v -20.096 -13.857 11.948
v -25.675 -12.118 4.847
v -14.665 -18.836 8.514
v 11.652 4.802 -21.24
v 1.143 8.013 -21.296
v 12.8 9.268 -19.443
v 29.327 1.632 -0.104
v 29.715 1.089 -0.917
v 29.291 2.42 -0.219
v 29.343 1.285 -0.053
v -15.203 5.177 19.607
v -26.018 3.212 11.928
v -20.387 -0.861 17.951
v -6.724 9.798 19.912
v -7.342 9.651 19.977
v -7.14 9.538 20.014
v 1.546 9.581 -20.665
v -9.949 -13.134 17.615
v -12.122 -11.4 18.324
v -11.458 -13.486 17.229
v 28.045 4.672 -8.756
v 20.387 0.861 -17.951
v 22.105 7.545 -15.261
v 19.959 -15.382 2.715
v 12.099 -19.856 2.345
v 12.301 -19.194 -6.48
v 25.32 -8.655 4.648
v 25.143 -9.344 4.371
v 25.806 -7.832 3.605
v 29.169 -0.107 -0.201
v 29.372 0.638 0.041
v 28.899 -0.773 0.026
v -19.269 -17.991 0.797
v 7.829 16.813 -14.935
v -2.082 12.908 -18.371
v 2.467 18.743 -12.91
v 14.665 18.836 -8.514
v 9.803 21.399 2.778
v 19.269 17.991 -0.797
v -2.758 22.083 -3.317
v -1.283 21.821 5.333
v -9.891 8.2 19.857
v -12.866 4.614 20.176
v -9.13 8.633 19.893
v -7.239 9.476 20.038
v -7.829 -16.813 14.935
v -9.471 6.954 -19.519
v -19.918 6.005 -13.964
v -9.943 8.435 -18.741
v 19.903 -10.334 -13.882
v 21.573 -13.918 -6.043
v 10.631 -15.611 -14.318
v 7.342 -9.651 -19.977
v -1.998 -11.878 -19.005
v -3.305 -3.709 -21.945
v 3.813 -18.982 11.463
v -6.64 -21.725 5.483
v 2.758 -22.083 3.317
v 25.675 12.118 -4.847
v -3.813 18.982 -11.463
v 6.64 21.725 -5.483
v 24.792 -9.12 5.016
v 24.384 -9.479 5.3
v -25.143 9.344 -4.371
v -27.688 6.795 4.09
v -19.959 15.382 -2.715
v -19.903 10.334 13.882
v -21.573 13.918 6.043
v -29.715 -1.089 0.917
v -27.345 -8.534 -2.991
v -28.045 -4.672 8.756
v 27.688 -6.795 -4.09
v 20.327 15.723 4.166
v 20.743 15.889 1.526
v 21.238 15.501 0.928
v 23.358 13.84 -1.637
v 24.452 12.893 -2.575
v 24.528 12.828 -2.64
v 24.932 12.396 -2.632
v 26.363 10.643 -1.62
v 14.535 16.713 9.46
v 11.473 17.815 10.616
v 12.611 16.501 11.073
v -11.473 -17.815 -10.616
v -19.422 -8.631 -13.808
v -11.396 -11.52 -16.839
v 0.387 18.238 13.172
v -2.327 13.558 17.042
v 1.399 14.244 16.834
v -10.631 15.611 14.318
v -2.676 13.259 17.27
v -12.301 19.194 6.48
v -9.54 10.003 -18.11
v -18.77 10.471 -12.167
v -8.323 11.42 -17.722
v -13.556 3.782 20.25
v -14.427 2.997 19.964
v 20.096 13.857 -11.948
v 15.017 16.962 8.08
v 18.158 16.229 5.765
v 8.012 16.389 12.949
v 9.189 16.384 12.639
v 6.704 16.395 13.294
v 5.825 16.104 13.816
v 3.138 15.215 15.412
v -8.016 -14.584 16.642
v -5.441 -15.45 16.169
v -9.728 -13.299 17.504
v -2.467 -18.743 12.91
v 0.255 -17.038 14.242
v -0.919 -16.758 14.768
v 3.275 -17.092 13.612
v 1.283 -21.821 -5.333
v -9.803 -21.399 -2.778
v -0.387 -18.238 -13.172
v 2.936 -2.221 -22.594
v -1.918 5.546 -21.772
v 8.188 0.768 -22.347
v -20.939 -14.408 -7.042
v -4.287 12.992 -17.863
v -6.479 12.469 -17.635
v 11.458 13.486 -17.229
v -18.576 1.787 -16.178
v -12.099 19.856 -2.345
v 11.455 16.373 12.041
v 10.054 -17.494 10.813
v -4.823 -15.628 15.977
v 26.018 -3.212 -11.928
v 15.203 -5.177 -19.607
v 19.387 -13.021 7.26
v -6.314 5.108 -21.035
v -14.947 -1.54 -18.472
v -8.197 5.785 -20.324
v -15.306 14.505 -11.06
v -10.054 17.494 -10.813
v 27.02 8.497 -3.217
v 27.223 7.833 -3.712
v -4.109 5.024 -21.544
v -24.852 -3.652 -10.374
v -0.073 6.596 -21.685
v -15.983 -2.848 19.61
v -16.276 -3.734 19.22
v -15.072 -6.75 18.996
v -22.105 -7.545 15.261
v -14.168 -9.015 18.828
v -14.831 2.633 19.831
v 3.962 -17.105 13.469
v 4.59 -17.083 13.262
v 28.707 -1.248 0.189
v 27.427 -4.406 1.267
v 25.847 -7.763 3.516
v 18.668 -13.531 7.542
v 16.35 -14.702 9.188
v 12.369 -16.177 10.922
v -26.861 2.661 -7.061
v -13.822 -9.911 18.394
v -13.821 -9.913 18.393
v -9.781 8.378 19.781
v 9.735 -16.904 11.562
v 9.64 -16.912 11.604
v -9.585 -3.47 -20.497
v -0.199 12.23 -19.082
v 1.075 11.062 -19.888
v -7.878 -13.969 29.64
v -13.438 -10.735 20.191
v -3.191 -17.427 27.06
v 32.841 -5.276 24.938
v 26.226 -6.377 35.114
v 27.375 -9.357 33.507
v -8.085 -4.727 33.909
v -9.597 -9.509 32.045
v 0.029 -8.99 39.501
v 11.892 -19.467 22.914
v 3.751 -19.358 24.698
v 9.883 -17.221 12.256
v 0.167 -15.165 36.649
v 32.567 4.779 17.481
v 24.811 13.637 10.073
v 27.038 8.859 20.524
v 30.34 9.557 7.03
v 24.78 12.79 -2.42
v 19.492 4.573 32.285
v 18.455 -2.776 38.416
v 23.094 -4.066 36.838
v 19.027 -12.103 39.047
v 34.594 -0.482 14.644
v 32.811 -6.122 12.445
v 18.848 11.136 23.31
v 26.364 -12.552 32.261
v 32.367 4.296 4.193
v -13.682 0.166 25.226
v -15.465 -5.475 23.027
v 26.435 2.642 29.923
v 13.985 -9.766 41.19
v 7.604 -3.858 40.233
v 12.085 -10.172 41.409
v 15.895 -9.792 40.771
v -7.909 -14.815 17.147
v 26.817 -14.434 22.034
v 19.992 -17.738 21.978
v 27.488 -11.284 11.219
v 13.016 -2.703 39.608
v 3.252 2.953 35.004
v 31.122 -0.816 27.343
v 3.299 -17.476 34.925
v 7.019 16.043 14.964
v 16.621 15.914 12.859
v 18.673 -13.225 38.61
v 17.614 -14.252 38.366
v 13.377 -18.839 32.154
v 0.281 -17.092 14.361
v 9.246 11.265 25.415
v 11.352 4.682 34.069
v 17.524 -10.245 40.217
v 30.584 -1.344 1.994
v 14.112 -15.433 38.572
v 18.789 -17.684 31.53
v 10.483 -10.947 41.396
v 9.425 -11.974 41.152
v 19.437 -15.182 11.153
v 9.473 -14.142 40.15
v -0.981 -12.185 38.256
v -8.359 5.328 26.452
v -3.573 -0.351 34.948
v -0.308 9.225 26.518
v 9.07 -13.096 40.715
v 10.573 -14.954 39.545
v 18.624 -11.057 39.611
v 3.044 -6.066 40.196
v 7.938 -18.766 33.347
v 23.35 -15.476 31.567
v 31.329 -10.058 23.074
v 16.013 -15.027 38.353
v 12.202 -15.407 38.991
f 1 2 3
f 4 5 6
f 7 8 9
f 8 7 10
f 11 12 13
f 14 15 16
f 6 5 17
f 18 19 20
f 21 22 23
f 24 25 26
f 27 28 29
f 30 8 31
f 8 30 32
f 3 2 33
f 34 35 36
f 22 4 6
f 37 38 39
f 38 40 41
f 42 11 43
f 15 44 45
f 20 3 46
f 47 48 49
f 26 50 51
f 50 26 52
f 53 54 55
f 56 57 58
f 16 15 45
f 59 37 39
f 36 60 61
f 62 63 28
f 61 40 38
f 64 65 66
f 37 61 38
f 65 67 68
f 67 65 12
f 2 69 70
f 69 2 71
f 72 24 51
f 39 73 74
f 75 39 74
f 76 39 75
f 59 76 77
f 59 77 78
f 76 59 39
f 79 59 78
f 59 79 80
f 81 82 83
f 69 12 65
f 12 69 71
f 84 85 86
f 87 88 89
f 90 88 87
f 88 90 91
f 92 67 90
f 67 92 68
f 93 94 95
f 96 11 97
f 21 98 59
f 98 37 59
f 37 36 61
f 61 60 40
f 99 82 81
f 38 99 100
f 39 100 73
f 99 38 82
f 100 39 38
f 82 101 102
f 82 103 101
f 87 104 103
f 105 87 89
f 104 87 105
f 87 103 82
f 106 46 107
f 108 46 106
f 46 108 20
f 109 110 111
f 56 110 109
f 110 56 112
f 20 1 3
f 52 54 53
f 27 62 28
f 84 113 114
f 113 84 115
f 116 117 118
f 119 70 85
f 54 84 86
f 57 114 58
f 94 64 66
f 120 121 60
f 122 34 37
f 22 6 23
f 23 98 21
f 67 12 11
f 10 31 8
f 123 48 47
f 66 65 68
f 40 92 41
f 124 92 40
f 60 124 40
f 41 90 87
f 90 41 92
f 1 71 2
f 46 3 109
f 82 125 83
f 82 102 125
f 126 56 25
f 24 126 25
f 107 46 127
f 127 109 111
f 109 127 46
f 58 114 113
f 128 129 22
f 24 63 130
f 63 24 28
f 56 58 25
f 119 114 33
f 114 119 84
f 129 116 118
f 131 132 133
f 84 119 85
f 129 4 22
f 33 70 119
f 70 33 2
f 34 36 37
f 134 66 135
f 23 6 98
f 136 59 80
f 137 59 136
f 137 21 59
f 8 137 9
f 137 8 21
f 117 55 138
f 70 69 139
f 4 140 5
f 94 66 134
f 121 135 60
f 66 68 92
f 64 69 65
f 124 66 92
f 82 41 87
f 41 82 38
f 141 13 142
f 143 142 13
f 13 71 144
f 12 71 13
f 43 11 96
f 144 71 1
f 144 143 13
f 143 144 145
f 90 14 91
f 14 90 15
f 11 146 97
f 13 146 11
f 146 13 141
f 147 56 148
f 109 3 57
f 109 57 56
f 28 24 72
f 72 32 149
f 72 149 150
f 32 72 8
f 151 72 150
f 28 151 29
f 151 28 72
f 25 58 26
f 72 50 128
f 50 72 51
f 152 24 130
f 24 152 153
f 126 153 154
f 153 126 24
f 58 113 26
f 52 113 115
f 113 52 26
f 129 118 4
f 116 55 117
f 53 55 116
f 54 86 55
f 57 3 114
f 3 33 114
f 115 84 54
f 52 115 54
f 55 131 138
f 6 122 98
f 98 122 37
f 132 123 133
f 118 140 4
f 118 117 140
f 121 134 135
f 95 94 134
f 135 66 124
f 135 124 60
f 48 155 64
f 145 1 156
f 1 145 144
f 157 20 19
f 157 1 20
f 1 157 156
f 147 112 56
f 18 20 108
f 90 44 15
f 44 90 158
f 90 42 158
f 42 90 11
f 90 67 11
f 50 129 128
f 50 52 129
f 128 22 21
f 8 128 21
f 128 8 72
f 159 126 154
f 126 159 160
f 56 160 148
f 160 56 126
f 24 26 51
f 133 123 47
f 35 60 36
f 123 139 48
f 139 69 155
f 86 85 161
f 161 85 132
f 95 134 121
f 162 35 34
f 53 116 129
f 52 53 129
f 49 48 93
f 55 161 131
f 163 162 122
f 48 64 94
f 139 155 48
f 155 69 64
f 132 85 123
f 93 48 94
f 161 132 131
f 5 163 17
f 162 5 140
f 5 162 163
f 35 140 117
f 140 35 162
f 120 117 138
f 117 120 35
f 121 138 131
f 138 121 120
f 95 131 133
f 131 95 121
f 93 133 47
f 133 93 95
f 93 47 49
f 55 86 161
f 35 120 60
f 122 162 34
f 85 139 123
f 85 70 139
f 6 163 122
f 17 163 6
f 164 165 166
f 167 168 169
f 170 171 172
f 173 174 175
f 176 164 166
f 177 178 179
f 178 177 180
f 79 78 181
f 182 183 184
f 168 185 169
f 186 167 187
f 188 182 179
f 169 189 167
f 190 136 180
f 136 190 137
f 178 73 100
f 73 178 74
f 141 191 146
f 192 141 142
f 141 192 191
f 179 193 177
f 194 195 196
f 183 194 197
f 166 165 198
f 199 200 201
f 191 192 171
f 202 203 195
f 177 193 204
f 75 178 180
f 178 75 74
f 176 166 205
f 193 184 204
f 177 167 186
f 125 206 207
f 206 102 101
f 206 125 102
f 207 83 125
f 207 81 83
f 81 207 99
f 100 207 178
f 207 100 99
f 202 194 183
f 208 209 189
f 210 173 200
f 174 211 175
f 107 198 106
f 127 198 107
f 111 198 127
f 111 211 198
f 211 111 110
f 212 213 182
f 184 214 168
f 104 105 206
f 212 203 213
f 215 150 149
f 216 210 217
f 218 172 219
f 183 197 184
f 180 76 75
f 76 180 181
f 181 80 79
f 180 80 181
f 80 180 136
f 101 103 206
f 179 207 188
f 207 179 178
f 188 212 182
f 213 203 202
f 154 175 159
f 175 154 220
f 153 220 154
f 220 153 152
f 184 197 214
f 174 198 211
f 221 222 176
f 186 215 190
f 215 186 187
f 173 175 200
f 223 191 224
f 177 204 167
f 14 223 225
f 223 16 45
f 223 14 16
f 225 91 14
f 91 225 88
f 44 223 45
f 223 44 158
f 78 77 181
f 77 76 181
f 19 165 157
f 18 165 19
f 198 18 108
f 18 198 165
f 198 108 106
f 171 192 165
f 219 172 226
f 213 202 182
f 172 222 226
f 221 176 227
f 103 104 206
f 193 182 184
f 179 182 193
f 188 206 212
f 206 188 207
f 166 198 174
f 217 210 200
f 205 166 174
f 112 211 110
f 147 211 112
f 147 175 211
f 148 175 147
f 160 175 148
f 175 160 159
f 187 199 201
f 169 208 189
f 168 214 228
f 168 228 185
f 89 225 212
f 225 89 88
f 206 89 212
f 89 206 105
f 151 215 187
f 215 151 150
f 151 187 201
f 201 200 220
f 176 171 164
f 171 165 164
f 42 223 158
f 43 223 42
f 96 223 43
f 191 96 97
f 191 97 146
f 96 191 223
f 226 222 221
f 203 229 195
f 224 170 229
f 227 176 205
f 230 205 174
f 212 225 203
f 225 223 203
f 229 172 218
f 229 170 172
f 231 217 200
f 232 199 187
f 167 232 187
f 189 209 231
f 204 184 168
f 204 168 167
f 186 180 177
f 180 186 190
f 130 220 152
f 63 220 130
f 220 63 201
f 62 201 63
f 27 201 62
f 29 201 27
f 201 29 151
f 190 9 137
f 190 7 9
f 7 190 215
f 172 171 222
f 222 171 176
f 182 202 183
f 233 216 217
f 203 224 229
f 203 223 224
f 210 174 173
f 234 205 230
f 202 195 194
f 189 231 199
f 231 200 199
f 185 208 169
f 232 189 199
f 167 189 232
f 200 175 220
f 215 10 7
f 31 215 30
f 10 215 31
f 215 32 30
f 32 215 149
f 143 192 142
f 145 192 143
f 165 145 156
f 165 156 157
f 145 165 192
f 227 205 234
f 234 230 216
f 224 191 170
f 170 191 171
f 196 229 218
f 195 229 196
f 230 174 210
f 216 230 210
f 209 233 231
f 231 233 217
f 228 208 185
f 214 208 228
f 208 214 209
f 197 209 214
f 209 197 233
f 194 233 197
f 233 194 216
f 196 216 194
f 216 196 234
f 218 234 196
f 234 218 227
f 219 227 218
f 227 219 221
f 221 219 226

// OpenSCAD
$fn=16;

rotate(a = 27, v = [0.7, 0.3, 0.1])
union() {
scale(v = [2, 1.5, 1.5])
	sphere(r = 15);
translate(v = [6, 5, 14])
	scale(v = [1.3, 0.8, 1.5])
		sphere(r = 20);
}
